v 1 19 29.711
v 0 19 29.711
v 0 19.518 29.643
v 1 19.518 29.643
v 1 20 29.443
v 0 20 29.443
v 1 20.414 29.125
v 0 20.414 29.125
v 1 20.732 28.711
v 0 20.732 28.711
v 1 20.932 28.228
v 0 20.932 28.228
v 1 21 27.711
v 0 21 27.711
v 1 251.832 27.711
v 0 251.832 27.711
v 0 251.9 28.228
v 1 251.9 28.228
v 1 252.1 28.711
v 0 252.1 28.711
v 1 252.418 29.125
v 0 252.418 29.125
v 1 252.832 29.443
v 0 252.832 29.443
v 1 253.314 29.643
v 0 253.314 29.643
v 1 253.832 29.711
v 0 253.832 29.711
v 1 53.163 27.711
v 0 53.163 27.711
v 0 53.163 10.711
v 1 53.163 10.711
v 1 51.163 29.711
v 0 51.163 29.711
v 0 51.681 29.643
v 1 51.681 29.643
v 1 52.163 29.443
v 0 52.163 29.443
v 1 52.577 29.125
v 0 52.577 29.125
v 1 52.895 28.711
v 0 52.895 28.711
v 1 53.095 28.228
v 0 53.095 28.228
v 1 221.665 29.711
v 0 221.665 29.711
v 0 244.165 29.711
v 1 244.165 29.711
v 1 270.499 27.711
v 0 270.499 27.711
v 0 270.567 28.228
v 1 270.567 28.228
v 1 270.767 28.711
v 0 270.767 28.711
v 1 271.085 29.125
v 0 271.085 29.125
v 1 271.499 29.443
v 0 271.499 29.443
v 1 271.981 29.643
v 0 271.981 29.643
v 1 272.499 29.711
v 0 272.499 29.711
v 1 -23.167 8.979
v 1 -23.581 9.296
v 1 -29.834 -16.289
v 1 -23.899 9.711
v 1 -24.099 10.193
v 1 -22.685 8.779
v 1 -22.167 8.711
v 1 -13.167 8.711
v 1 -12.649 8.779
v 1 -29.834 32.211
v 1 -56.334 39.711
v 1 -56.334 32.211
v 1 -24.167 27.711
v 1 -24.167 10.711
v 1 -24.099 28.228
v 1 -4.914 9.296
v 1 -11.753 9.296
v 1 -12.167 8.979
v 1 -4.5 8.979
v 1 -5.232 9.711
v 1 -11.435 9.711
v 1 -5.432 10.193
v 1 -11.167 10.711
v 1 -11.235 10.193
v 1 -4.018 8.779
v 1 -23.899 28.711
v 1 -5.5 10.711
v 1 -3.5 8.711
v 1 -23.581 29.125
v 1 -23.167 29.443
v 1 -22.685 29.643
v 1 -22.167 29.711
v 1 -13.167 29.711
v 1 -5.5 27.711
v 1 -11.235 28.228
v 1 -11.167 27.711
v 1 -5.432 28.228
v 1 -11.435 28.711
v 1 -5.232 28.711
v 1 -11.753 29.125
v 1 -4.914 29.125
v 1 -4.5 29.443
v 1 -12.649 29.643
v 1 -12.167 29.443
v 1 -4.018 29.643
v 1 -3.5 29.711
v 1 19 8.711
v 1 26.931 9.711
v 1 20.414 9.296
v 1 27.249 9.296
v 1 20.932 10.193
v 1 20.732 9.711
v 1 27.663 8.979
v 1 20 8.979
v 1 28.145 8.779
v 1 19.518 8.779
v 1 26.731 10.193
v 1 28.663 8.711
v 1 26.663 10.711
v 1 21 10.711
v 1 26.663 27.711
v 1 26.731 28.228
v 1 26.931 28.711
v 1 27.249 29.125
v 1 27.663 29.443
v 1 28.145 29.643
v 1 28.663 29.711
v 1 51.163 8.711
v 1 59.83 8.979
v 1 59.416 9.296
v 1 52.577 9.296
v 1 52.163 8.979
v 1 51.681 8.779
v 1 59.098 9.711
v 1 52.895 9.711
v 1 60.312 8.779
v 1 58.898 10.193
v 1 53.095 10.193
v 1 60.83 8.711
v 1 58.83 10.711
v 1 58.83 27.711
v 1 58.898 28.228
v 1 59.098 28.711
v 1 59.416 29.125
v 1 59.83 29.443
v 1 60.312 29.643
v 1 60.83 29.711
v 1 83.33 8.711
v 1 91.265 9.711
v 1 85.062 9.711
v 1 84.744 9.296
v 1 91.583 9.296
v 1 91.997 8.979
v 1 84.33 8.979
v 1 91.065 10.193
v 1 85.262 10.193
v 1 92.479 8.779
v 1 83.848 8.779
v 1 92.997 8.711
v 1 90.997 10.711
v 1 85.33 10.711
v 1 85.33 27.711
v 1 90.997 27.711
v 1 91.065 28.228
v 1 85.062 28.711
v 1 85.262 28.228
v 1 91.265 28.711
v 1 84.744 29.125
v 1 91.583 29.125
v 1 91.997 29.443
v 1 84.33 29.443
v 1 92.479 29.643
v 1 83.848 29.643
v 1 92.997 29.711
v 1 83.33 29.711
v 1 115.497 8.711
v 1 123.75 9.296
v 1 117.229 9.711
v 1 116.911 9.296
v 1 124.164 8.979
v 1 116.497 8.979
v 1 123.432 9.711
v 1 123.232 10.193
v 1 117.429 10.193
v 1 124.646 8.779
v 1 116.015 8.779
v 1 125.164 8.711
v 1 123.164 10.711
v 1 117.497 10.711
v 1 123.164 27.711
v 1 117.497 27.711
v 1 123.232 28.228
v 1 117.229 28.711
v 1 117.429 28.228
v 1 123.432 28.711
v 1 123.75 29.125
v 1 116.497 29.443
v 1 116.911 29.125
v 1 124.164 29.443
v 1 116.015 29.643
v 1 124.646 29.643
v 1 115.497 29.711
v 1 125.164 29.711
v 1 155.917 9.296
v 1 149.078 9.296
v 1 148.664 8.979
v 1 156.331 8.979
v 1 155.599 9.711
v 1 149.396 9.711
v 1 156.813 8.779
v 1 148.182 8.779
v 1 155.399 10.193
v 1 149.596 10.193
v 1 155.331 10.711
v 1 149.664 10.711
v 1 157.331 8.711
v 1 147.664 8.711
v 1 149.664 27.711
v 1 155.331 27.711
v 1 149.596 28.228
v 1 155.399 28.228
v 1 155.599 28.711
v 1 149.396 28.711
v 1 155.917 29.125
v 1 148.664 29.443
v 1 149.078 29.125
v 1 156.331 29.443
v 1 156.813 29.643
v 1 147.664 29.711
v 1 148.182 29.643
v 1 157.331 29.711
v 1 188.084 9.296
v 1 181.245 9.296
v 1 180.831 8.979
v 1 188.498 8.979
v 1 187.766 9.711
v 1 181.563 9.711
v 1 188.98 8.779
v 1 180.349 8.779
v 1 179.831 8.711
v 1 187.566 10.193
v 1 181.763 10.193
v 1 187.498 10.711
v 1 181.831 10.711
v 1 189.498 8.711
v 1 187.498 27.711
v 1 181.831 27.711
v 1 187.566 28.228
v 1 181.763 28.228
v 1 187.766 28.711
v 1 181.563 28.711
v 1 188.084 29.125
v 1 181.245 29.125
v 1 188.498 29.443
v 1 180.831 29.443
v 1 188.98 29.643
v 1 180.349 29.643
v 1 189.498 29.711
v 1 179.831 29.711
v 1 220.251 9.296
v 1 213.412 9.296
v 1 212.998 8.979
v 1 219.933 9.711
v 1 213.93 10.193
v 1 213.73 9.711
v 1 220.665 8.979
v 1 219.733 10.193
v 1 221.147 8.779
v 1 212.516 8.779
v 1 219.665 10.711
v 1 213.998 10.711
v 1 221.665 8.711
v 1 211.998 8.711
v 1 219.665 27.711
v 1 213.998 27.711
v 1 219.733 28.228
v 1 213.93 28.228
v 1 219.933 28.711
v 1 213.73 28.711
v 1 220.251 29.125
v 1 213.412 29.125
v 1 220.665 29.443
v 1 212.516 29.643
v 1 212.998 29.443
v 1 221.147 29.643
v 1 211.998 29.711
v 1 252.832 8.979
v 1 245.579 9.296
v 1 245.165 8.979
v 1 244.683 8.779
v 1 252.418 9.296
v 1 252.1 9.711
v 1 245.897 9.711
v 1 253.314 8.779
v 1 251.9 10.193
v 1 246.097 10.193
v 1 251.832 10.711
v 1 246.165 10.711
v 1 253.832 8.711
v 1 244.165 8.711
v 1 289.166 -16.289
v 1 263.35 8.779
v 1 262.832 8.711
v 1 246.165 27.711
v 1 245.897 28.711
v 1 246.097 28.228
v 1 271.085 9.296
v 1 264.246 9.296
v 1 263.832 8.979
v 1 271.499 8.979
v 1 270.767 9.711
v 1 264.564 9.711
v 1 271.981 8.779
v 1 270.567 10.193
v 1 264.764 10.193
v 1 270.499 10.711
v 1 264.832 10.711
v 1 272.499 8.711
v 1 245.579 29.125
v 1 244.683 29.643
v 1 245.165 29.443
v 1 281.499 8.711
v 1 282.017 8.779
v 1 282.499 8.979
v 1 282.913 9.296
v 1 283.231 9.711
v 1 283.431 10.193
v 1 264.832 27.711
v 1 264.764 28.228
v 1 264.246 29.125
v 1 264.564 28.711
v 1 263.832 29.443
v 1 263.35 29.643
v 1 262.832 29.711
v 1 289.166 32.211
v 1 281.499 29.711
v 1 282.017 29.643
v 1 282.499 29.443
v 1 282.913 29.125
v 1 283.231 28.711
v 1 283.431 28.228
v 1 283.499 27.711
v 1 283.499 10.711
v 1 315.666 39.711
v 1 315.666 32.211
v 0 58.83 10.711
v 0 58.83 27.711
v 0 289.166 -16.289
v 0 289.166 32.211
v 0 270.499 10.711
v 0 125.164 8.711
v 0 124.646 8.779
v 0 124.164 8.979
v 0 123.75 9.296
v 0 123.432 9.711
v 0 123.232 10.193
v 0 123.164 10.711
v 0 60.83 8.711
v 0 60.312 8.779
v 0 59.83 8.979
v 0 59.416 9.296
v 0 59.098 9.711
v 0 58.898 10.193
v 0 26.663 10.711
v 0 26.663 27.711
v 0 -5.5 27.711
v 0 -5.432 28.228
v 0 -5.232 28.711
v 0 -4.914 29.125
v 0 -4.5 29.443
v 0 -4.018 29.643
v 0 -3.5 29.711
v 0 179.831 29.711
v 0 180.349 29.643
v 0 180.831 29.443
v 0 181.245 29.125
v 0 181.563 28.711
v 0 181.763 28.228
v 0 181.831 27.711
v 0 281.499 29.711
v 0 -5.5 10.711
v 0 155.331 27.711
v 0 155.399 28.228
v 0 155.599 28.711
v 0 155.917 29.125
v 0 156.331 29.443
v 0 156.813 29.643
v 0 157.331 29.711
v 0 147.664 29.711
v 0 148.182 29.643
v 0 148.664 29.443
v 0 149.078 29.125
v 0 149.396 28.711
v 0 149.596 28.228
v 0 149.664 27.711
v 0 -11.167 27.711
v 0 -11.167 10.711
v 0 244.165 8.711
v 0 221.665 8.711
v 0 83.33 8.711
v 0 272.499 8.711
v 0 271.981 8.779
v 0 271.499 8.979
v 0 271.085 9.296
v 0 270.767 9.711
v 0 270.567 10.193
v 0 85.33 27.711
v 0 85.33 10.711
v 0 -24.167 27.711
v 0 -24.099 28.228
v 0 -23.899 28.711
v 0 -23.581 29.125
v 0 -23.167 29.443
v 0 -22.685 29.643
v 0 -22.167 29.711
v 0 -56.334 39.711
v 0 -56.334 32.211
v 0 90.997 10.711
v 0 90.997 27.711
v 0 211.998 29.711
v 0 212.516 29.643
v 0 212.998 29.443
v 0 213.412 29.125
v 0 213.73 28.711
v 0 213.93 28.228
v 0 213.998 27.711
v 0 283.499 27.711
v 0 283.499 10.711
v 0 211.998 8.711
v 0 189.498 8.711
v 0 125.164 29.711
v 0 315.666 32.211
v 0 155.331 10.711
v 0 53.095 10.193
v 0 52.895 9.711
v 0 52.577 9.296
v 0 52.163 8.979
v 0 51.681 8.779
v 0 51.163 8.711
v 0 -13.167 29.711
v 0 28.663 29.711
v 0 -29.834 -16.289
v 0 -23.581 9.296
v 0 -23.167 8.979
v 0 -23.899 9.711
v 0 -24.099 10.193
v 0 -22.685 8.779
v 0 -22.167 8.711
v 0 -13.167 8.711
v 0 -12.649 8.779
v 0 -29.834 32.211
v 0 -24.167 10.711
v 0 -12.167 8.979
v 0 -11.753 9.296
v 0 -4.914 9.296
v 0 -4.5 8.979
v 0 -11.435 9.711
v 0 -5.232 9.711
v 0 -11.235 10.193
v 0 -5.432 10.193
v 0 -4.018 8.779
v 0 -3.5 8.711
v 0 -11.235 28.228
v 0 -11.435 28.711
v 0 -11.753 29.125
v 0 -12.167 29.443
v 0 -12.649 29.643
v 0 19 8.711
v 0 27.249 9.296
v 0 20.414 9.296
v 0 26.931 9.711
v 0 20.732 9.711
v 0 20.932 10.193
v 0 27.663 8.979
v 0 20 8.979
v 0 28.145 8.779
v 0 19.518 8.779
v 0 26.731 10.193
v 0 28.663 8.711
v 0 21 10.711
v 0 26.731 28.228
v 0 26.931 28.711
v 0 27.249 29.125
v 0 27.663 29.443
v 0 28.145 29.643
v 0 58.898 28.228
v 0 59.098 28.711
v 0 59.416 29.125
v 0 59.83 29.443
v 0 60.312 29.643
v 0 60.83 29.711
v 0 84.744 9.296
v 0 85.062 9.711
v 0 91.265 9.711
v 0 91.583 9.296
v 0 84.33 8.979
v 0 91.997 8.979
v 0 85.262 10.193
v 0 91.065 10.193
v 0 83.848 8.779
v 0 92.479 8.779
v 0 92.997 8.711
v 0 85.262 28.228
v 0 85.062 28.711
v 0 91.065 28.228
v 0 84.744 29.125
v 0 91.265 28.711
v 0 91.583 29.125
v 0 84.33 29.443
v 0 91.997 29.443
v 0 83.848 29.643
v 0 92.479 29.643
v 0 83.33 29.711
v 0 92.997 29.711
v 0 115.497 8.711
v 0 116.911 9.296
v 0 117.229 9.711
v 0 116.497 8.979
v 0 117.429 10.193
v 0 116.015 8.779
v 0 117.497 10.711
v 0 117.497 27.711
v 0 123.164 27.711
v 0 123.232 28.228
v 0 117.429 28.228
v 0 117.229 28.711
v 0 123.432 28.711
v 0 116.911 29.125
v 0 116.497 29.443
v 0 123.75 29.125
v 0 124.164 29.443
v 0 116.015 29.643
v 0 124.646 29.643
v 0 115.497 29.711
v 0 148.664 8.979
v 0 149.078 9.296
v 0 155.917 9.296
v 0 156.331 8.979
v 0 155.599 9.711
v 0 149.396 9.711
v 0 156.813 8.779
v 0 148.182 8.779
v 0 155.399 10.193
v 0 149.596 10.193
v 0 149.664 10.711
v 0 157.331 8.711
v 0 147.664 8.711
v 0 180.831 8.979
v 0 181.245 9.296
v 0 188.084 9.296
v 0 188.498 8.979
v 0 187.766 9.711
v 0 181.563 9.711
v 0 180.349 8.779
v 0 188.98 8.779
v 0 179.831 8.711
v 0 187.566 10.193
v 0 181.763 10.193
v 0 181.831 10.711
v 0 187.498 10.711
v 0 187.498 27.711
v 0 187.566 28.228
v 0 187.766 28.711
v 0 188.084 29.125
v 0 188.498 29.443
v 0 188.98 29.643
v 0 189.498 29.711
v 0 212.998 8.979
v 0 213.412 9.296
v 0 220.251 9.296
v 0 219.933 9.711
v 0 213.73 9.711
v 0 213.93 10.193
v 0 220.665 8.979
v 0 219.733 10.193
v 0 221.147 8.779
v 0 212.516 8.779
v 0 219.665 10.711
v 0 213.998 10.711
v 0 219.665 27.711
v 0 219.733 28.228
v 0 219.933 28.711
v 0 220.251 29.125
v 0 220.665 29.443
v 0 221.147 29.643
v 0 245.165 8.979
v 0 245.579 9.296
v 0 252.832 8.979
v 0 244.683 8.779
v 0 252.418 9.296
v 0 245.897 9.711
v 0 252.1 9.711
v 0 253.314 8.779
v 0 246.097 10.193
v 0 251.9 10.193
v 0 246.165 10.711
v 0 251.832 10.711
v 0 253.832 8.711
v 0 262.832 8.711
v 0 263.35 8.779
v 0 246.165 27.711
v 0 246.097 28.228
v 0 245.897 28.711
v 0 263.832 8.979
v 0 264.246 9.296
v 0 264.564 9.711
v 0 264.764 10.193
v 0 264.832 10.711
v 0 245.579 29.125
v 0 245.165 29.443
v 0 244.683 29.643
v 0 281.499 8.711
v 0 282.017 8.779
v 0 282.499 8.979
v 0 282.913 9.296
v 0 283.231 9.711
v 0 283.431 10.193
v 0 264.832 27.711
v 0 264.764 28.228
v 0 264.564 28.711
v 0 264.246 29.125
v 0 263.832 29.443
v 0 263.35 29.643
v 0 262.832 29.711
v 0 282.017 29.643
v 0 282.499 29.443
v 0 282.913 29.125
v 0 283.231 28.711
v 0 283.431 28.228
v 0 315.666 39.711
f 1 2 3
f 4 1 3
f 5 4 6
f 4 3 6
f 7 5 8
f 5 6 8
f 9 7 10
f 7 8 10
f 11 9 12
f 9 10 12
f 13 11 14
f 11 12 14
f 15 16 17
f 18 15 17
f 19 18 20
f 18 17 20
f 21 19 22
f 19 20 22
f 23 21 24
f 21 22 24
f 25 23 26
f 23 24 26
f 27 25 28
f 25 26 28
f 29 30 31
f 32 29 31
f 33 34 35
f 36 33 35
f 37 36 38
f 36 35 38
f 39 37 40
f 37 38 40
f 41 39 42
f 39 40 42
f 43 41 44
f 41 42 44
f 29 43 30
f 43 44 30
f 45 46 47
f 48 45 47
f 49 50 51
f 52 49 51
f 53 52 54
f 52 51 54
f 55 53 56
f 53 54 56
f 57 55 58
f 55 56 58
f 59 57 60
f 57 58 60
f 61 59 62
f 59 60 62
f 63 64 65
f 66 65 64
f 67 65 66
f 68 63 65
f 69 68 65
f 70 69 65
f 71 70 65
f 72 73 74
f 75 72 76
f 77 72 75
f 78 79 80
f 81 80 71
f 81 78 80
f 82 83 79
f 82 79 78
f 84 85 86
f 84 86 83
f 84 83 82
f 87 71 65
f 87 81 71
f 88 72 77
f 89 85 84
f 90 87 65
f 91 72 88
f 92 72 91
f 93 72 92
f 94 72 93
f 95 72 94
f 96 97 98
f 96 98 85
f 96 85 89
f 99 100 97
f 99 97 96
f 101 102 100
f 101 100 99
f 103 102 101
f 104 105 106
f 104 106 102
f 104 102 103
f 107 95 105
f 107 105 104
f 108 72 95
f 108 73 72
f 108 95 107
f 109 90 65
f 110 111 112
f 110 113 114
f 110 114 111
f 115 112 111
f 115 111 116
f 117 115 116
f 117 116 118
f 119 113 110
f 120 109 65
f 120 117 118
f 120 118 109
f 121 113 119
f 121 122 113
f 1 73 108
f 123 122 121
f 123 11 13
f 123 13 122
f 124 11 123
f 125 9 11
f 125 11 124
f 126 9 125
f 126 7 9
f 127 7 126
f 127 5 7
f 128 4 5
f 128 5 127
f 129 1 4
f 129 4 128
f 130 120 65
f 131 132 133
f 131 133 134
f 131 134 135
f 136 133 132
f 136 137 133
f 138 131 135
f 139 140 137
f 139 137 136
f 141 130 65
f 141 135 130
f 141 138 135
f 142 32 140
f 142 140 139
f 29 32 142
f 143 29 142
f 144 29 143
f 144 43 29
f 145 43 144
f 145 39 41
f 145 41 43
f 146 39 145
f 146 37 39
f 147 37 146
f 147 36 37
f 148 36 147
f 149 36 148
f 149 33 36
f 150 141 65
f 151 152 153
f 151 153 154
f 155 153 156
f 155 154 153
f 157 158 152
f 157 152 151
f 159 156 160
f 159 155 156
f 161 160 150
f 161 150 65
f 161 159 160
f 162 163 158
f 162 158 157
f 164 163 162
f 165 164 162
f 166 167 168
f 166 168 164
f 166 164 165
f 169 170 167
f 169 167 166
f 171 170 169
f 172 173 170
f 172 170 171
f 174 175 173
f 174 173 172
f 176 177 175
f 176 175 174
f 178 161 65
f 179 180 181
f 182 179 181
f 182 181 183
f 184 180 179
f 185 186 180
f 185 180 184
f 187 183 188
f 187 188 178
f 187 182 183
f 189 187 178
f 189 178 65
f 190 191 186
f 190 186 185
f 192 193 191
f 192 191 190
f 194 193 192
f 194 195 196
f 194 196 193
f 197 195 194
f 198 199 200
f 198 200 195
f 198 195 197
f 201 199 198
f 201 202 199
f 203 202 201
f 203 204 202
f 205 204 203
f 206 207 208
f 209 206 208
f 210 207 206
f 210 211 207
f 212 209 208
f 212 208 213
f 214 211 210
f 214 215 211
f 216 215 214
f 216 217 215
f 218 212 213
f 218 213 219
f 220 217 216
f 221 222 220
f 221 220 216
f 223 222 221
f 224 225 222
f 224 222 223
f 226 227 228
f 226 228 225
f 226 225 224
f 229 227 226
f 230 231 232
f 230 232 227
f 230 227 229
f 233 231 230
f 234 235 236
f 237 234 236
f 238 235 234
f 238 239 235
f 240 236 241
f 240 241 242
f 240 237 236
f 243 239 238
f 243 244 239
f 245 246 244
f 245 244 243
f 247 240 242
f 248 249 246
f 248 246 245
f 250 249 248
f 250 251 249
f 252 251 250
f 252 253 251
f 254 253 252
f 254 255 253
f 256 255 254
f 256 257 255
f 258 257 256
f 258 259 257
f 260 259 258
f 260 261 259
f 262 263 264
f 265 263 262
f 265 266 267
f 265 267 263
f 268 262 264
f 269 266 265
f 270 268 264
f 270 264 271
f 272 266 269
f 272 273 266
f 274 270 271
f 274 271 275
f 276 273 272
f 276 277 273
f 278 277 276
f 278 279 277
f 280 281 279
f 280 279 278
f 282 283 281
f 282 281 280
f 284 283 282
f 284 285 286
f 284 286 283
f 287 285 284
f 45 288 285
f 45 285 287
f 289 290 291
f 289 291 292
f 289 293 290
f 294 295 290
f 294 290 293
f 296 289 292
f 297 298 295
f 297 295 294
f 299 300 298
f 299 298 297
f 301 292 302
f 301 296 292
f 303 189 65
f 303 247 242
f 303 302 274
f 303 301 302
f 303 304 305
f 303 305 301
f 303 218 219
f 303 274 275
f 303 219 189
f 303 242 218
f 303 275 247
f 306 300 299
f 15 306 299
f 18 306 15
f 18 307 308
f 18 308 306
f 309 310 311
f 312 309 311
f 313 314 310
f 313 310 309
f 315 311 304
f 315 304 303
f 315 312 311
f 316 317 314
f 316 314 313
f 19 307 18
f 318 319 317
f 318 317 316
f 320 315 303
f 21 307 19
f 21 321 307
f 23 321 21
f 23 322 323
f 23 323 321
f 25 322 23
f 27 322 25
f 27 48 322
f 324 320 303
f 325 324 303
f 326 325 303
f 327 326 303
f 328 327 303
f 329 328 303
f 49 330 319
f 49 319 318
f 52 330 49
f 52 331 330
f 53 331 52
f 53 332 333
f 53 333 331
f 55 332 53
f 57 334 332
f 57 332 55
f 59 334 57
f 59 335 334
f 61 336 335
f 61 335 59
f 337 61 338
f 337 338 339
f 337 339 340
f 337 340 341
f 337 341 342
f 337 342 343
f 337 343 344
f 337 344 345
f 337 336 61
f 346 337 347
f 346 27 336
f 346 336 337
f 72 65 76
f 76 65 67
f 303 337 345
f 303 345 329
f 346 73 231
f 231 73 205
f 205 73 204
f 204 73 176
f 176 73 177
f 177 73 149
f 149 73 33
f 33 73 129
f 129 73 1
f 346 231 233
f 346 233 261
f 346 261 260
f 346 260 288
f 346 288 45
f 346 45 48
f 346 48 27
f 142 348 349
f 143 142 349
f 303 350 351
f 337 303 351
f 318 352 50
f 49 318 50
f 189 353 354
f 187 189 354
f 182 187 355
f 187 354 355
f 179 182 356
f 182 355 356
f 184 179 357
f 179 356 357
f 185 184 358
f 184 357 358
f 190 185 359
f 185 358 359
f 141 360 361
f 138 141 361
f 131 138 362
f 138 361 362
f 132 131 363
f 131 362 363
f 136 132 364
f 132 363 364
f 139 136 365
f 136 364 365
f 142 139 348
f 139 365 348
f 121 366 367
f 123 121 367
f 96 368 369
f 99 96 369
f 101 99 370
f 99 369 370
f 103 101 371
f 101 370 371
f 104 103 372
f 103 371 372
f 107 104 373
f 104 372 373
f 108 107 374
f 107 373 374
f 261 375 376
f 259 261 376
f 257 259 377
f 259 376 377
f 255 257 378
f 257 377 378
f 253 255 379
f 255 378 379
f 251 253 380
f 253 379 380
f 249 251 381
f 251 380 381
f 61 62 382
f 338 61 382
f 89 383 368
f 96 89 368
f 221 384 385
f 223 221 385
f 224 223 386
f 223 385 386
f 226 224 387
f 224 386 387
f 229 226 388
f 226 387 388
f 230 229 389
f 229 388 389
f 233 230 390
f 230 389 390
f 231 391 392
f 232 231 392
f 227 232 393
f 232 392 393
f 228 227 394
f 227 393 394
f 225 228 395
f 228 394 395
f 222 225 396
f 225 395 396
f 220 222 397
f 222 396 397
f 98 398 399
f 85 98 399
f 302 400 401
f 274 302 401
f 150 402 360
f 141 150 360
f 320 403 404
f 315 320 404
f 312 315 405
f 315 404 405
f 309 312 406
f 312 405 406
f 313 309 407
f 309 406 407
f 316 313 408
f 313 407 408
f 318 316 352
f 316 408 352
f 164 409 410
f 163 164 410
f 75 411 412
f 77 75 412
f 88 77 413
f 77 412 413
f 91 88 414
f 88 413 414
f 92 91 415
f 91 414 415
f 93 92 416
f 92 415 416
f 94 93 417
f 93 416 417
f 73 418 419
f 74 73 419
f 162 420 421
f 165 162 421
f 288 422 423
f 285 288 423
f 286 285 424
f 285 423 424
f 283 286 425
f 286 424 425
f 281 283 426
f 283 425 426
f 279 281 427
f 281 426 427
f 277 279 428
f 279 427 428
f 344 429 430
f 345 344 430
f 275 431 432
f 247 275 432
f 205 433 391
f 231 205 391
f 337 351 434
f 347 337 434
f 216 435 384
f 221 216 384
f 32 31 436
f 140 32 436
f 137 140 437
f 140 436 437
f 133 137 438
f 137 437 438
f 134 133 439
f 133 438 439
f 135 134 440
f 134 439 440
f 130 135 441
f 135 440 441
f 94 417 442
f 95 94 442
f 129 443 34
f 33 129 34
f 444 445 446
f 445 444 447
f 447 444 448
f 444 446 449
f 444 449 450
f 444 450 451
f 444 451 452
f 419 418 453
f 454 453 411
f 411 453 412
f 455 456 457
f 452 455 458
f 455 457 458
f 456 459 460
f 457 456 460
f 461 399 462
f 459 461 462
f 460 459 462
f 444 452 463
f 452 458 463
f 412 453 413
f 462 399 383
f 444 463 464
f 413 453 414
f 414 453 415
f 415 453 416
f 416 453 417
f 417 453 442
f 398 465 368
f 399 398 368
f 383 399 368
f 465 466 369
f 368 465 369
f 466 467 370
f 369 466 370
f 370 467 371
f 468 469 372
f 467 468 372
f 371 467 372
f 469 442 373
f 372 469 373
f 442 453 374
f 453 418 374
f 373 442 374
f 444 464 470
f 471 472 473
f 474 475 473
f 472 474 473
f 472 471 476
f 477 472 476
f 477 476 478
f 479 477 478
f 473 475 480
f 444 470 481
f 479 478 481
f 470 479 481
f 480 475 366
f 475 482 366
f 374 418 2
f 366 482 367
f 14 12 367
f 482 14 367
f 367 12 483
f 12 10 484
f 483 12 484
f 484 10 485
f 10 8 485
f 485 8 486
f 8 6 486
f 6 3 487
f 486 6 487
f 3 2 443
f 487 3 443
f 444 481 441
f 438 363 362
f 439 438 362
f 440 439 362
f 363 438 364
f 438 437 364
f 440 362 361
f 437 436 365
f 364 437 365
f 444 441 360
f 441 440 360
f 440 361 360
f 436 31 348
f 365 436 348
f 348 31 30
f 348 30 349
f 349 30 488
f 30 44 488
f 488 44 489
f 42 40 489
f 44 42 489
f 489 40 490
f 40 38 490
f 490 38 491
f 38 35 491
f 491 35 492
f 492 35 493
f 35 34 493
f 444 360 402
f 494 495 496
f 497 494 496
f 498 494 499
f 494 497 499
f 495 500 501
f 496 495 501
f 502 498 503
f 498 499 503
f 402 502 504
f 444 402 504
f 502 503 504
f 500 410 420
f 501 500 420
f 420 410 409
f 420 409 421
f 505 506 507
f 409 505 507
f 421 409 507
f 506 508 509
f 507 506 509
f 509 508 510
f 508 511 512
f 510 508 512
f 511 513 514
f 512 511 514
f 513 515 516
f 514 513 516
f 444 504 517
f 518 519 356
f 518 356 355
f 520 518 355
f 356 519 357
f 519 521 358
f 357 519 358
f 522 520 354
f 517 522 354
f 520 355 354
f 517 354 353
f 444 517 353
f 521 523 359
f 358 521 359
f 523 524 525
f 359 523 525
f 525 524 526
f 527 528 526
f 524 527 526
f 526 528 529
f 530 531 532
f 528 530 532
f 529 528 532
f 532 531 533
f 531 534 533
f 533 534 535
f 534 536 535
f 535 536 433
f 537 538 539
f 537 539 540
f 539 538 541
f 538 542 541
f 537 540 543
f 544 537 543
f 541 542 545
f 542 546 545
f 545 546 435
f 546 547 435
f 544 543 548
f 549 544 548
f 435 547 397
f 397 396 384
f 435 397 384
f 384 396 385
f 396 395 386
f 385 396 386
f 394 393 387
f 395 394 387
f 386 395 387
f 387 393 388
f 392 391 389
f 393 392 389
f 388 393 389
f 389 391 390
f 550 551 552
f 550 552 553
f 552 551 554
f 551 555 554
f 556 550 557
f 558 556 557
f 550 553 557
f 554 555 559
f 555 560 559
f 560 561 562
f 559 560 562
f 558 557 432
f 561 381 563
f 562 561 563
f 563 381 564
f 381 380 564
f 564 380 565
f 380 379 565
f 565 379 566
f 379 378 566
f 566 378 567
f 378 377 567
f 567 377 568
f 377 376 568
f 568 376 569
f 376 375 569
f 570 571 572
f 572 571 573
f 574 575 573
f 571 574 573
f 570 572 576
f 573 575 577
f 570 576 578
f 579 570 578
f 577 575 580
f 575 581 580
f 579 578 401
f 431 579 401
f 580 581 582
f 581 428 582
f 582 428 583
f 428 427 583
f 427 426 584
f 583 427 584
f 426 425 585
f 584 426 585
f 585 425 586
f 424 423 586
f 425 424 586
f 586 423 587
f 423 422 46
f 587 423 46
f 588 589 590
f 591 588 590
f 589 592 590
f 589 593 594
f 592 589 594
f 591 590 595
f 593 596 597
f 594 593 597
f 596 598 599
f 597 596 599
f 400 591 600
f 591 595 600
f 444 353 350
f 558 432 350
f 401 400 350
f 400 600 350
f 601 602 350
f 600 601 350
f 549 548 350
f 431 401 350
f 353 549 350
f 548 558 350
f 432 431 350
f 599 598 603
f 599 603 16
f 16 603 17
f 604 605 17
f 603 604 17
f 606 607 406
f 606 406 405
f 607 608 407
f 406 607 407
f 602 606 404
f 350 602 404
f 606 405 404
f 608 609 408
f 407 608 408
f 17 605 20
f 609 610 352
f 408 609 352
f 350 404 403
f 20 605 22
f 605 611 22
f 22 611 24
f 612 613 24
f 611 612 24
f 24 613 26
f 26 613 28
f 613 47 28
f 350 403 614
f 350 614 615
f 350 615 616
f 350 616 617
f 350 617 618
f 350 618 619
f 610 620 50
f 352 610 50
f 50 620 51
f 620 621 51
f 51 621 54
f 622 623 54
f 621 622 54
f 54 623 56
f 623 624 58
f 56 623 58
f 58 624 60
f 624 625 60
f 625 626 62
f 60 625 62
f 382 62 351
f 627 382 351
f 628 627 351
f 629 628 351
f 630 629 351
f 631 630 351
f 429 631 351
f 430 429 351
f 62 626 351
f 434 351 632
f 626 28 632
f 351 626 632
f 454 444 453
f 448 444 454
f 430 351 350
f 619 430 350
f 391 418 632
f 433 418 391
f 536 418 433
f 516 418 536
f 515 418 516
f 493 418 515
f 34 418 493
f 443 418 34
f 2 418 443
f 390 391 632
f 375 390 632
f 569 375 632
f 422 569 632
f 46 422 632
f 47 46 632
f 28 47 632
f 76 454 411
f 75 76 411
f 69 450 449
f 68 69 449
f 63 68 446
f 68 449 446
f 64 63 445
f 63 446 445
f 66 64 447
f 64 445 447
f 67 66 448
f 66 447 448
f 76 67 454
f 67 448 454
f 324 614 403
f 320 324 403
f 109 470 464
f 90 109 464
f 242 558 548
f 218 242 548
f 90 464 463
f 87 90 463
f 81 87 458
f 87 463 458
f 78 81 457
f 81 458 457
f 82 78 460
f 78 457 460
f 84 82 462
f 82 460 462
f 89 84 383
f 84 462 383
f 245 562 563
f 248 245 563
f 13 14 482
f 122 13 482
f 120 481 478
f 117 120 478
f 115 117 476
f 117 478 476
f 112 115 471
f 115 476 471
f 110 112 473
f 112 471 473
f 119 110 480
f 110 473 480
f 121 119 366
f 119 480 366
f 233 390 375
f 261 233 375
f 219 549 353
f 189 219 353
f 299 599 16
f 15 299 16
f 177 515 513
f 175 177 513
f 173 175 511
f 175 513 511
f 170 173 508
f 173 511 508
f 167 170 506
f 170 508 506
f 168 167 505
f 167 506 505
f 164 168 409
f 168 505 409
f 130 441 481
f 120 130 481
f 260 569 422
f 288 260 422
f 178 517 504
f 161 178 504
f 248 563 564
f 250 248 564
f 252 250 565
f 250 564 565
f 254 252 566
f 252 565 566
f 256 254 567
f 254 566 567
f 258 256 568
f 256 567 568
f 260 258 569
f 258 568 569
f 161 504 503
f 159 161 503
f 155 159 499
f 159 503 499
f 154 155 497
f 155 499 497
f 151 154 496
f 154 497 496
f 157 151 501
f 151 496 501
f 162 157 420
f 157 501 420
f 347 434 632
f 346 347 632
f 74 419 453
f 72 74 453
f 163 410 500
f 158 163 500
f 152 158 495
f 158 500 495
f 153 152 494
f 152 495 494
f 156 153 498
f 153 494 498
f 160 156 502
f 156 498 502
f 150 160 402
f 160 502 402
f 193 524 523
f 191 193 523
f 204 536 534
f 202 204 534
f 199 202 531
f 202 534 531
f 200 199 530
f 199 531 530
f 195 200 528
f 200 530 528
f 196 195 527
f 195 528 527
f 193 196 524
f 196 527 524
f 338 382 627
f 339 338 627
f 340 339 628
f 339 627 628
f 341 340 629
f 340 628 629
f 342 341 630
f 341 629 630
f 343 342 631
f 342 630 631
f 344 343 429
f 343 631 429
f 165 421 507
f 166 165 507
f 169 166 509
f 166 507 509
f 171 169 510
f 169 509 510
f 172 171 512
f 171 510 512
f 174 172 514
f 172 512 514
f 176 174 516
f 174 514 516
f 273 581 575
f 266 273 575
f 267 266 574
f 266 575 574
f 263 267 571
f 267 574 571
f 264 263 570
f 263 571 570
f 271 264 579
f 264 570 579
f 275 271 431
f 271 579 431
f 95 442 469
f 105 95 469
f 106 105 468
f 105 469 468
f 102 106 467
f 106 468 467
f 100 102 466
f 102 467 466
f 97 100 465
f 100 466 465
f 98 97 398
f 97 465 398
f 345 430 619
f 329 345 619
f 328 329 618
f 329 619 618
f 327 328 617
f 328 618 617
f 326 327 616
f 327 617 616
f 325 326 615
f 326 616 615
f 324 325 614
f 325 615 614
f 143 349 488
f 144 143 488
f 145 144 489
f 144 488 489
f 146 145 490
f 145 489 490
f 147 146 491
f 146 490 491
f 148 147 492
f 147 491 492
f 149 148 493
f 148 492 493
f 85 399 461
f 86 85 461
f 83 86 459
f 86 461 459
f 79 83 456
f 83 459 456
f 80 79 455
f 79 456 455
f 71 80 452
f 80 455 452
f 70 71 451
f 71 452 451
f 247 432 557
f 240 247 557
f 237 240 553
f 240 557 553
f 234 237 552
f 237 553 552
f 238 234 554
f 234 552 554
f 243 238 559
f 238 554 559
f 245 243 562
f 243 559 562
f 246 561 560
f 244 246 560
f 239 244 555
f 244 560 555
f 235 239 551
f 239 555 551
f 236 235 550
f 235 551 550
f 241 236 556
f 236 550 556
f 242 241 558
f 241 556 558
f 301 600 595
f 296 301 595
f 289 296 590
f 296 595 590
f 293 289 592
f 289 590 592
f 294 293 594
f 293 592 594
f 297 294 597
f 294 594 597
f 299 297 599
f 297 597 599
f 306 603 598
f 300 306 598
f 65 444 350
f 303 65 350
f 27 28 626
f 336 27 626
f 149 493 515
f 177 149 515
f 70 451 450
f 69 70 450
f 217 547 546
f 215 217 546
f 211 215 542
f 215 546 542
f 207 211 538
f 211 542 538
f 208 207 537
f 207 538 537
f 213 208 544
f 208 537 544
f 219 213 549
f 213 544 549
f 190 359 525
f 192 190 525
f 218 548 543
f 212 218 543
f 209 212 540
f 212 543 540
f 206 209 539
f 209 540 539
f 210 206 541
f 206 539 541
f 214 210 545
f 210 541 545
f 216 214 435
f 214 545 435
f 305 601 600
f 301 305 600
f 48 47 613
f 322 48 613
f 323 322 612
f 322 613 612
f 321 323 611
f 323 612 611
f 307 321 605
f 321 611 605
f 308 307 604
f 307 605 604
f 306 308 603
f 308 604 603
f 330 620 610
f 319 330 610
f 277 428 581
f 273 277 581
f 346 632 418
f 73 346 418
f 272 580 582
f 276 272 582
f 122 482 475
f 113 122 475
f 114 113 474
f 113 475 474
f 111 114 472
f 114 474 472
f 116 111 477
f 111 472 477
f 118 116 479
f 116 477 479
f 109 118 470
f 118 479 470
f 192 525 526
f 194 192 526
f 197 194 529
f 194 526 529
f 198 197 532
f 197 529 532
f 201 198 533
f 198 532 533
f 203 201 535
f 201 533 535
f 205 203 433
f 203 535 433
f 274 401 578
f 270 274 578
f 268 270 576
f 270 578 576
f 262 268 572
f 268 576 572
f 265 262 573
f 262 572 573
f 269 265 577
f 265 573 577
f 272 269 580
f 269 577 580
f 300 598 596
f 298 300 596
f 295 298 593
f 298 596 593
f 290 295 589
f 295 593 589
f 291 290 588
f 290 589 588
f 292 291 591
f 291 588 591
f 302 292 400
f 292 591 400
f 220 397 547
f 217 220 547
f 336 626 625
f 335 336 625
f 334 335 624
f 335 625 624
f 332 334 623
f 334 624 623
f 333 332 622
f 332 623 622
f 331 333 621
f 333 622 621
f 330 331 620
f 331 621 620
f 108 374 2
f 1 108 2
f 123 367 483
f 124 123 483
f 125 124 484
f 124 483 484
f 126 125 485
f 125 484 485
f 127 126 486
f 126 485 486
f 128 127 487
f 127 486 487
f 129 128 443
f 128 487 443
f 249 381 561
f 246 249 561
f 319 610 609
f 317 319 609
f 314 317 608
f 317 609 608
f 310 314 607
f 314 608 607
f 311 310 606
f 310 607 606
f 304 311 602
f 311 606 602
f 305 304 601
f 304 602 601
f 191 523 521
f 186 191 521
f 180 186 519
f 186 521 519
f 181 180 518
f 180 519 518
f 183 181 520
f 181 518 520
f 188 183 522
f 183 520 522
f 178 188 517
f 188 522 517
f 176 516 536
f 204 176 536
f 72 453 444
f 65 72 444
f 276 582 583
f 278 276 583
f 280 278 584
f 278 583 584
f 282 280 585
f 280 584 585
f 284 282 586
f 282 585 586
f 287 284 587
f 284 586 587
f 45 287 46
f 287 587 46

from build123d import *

# Parameters (mm, degrees)
F1_DEPTH = 1


with BuildPart() as f1:
    # F0 (on Right) → F1 (new body)
    with BuildSketch(Plane.YZ):
        Polygon((289.166, 39.710689), (-29.834, 39.710689), (-56.334, 39.710689), (-56.334, 32.210689), (-29.834, 32.210689), (-29.834, -16.289311), (289.166, -16.289311), (289.166, 32.210689), (315.666, 32.210689), (315.666, 39.710689), align=None)
        with BuildLine():
            ThreePointArc((-24.167, 27.710689), (-23.581214, 29.124903), (-22.167, 29.710689))
            Line((-22.167, 29.710689), (-13.167, 29.710689))
            ThreePointArc((-13.167, 29.710689), (-11.752786, 29.124903), (-11.167, 27.710689))
            Line((-11.167, 27.710689), (-11.167, 10.710689))
            ThreePointArc((-11.167, 10.710689), (-11.752786, 9.296475), (-13.167, 8.710689))
            Line((-13.167, 8.710689), (-22.167, 8.710689))
            ThreePointArc((-22.167, 8.710689), (-23.581214, 9.296475), (-24.167, 10.710689))
            Line((-24.167, 10.710689), (-24.167, 27.710689))
        make_face(mode=Mode.SUBTRACT)
        with BuildLine():
            ThreePointArc((-5.5, 27.710689), (-4.914214, 29.124903), (-3.5, 29.710689))
            Line((-3.5, 29.710689), (19, 29.710689))
            ThreePointArc((19, 29.710689), (20.414214, 29.124903), (21, 27.710689))
            Line((21, 27.710689), (21, 10.710689))
            ThreePointArc((21, 10.710689), (20.414214, 9.296475), (19, 8.710689))
            Line((19, 8.710689), (-3.5, 8.710689))
            ThreePointArc((-3.5, 8.710689), (-4.914214, 9.296475), (-5.5, 10.710689))
            Line((-5.5, 10.710689), (-5.5, 27.710689))
        make_face(mode=Mode.SUBTRACT)
        with BuildLine():
            ThreePointArc((26.663, 27.710689), (27.248786, 29.124903), (28.663, 29.710689))
            Line((28.663, 29.710689), (51.163, 29.710689))
            ThreePointArc((51.163, 29.710689), (52.577214, 29.124903), (53.163, 27.710689))
            Line((53.163, 27.710689), (53.163, 10.710689))
            ThreePointArc((53.163, 10.710689), (52.577214, 9.296475), (51.163, 8.710689))
            Line((51.163, 8.710689), (28.663, 8.710689))
            ThreePointArc((28.663, 8.710689), (27.248786, 9.296475), (26.663, 10.710689))
            Line((26.663, 10.710689), (26.663, 27.710689))
        make_face(mode=Mode.SUBTRACT)
        with BuildLine():
            ThreePointArc((58.83, 27.710689), (59.415786, 29.124903), (60.83, 29.710689))
            Line((60.83, 29.710689), (83.33, 29.710689))
            ThreePointArc((83.33, 29.710689), (84.744214, 29.124903), (85.33, 27.710689))
            Line((85.33, 27.710689), (85.33, 10.710689))
            ThreePointArc((85.33, 10.710689), (84.744214, 9.296475), (83.33, 8.710689))
            Line((83.33, 8.710689), (60.83, 8.710689))
            ThreePointArc((60.83, 8.710689), (59.415786, 9.296475), (58.83, 10.710689))
            Line((58.83, 10.710689), (58.83, 27.710689))
        make_face(mode=Mode.SUBTRACT)
        with BuildLine():
            ThreePointArc((90.997, 27.710689), (91.582786, 29.124903), (92.997, 29.710689))
            Line((92.997, 29.710689), (115.497, 29.710689))
            ThreePointArc((115.497, 29.710689), (116.911214, 29.124903), (117.497, 27.710689))
            Line((117.497, 27.710689), (117.497, 10.710689))
            ThreePointArc((117.497, 10.710689), (116.911214, 9.296475), (115.497, 8.710689))
            Line((115.497, 8.710689), (92.997, 8.710689))
            ThreePointArc((92.997, 8.710689), (91.582786, 9.296475), (90.997, 10.710689))
            Line((90.997, 10.710689), (90.997, 27.710689))
        make_face(mode=Mode.SUBTRACT)
        with BuildLine():
            ThreePointArc((123.164, 27.710689), (123.749786, 29.124903), (125.164, 29.710689))
            Line((125.164, 29.710689), (147.664, 29.710689))
            ThreePointArc((147.664, 29.710689), (149.078214, 29.124903), (149.664, 27.710689))
            Line((149.664, 27.710689), (149.664, 10.710689))
            ThreePointArc((149.664, 10.710689), (149.078214, 9.296475), (147.664, 8.710689))
            Line((147.664, 8.710689), (125.164, 8.710689))
            ThreePointArc((125.164, 8.710689), (123.749786, 9.296475), (123.164, 10.710689))
            Line((123.164, 10.710689), (123.164, 27.710689))
        make_face(mode=Mode.SUBTRACT)
        with BuildLine():
            ThreePointArc((155.331, 27.710689), (155.916786, 29.124903), (157.331, 29.710689))
            Line((157.331, 29.710689), (179.831, 29.710689))
            ThreePointArc((179.831, 29.710689), (181.245214, 29.124903), (181.831, 27.710689))
            Line((181.831, 27.710689), (181.831, 10.710689))
            ThreePointArc((181.831, 10.710689), (181.245214, 9.296475), (179.831, 8.710689))
            Line((179.831, 8.710689), (157.331, 8.710689))
            ThreePointArc((157.331, 8.710689), (155.916786, 9.296475), (155.331, 10.710689))
            Line((155.331, 10.710689), (155.331, 27.710689))
        make_face(mode=Mode.SUBTRACT)
        with BuildLine():
            ThreePointArc((187.498, 27.710689), (188.083786, 29.124903), (189.498, 29.710689))
            Line((189.498, 29.710689), (211.998, 29.710689))
            ThreePointArc((211.998, 29.710689), (213.412214, 29.124903), (213.998, 27.710689))
            Line((213.998, 27.710689), (213.998, 10.710689))
            ThreePointArc((213.998, 10.710689), (213.412214, 9.296475), (211.998, 8.710689))
            Line((211.998, 8.710689), (189.498, 8.710689))
            ThreePointArc((189.498, 8.710689), (188.083786, 9.296475), (187.498, 10.710689))
            Line((187.498, 10.710689), (187.498, 27.710689))
        make_face(mode=Mode.SUBTRACT)
        with BuildLine():
            ThreePointArc((219.665, 27.710689), (220.250786, 29.124903), (221.665, 29.710689))
            Line((221.665, 29.710689), (244.165, 29.710689))
            ThreePointArc((244.165, 29.710689), (245.579214, 29.124903), (246.165, 27.710689))
            Line((246.165, 27.710689), (246.165, 10.710689))
            ThreePointArc((246.165, 10.710689), (245.579214, 9.296475), (244.165, 8.710689))
            Line((244.165, 8.710689), (221.665, 8.710689))
            ThreePointArc((221.665, 8.710689), (220.250786, 9.296475), (219.665, 10.710689))
            Line((219.665, 10.710689), (219.665, 27.710689))
        make_face(mode=Mode.SUBTRACT)
        with BuildLine():
            ThreePointArc((251.832, 27.710689), (252.417786, 29.124903), (253.832, 29.710689))
            Line((253.832, 29.710689), (262.832, 29.710689))
            ThreePointArc((262.832, 29.710689), (264.246214, 29.124903), (264.832, 27.710689))
            Line((264.832, 27.710689), (264.832, 10.710689))
            ThreePointArc((264.832, 10.710689), (264.246214, 9.296475), (262.832, 8.710689))
            Line((262.832, 8.710689), (253.832, 8.710689))
            ThreePointArc((253.832, 8.710689), (252.417786, 9.296475), (251.832, 10.710689))
            Line((251.832, 10.710689), (251.832, 27.710689))
        make_face(mode=Mode.SUBTRACT)
        with BuildLine():
            ThreePointArc((270.499, 27.710689), (271.084786, 29.124903), (272.499, 29.710689))
            Line((272.499, 29.710689), (281.499, 29.710689))
            ThreePointArc((281.499, 29.710689), (282.913214, 29.124903), (283.499, 27.710689))
            Line((283.499, 27.710689), (283.499, 10.710689))
            ThreePointArc((283.499, 10.710689), (282.913214, 9.296475), (281.499, 8.710689))
            Line((281.499, 8.710689), (272.499, 8.710689))
            ThreePointArc((272.499, 8.710689), (271.084786, 9.296475), (270.499, 10.710689))
            Line((270.499, 10.710689), (270.499, 27.710689))
        make_face(mode=Mode.SUBTRACT)
    extrude(amount=F1_DEPTH)


solid = f1.part
